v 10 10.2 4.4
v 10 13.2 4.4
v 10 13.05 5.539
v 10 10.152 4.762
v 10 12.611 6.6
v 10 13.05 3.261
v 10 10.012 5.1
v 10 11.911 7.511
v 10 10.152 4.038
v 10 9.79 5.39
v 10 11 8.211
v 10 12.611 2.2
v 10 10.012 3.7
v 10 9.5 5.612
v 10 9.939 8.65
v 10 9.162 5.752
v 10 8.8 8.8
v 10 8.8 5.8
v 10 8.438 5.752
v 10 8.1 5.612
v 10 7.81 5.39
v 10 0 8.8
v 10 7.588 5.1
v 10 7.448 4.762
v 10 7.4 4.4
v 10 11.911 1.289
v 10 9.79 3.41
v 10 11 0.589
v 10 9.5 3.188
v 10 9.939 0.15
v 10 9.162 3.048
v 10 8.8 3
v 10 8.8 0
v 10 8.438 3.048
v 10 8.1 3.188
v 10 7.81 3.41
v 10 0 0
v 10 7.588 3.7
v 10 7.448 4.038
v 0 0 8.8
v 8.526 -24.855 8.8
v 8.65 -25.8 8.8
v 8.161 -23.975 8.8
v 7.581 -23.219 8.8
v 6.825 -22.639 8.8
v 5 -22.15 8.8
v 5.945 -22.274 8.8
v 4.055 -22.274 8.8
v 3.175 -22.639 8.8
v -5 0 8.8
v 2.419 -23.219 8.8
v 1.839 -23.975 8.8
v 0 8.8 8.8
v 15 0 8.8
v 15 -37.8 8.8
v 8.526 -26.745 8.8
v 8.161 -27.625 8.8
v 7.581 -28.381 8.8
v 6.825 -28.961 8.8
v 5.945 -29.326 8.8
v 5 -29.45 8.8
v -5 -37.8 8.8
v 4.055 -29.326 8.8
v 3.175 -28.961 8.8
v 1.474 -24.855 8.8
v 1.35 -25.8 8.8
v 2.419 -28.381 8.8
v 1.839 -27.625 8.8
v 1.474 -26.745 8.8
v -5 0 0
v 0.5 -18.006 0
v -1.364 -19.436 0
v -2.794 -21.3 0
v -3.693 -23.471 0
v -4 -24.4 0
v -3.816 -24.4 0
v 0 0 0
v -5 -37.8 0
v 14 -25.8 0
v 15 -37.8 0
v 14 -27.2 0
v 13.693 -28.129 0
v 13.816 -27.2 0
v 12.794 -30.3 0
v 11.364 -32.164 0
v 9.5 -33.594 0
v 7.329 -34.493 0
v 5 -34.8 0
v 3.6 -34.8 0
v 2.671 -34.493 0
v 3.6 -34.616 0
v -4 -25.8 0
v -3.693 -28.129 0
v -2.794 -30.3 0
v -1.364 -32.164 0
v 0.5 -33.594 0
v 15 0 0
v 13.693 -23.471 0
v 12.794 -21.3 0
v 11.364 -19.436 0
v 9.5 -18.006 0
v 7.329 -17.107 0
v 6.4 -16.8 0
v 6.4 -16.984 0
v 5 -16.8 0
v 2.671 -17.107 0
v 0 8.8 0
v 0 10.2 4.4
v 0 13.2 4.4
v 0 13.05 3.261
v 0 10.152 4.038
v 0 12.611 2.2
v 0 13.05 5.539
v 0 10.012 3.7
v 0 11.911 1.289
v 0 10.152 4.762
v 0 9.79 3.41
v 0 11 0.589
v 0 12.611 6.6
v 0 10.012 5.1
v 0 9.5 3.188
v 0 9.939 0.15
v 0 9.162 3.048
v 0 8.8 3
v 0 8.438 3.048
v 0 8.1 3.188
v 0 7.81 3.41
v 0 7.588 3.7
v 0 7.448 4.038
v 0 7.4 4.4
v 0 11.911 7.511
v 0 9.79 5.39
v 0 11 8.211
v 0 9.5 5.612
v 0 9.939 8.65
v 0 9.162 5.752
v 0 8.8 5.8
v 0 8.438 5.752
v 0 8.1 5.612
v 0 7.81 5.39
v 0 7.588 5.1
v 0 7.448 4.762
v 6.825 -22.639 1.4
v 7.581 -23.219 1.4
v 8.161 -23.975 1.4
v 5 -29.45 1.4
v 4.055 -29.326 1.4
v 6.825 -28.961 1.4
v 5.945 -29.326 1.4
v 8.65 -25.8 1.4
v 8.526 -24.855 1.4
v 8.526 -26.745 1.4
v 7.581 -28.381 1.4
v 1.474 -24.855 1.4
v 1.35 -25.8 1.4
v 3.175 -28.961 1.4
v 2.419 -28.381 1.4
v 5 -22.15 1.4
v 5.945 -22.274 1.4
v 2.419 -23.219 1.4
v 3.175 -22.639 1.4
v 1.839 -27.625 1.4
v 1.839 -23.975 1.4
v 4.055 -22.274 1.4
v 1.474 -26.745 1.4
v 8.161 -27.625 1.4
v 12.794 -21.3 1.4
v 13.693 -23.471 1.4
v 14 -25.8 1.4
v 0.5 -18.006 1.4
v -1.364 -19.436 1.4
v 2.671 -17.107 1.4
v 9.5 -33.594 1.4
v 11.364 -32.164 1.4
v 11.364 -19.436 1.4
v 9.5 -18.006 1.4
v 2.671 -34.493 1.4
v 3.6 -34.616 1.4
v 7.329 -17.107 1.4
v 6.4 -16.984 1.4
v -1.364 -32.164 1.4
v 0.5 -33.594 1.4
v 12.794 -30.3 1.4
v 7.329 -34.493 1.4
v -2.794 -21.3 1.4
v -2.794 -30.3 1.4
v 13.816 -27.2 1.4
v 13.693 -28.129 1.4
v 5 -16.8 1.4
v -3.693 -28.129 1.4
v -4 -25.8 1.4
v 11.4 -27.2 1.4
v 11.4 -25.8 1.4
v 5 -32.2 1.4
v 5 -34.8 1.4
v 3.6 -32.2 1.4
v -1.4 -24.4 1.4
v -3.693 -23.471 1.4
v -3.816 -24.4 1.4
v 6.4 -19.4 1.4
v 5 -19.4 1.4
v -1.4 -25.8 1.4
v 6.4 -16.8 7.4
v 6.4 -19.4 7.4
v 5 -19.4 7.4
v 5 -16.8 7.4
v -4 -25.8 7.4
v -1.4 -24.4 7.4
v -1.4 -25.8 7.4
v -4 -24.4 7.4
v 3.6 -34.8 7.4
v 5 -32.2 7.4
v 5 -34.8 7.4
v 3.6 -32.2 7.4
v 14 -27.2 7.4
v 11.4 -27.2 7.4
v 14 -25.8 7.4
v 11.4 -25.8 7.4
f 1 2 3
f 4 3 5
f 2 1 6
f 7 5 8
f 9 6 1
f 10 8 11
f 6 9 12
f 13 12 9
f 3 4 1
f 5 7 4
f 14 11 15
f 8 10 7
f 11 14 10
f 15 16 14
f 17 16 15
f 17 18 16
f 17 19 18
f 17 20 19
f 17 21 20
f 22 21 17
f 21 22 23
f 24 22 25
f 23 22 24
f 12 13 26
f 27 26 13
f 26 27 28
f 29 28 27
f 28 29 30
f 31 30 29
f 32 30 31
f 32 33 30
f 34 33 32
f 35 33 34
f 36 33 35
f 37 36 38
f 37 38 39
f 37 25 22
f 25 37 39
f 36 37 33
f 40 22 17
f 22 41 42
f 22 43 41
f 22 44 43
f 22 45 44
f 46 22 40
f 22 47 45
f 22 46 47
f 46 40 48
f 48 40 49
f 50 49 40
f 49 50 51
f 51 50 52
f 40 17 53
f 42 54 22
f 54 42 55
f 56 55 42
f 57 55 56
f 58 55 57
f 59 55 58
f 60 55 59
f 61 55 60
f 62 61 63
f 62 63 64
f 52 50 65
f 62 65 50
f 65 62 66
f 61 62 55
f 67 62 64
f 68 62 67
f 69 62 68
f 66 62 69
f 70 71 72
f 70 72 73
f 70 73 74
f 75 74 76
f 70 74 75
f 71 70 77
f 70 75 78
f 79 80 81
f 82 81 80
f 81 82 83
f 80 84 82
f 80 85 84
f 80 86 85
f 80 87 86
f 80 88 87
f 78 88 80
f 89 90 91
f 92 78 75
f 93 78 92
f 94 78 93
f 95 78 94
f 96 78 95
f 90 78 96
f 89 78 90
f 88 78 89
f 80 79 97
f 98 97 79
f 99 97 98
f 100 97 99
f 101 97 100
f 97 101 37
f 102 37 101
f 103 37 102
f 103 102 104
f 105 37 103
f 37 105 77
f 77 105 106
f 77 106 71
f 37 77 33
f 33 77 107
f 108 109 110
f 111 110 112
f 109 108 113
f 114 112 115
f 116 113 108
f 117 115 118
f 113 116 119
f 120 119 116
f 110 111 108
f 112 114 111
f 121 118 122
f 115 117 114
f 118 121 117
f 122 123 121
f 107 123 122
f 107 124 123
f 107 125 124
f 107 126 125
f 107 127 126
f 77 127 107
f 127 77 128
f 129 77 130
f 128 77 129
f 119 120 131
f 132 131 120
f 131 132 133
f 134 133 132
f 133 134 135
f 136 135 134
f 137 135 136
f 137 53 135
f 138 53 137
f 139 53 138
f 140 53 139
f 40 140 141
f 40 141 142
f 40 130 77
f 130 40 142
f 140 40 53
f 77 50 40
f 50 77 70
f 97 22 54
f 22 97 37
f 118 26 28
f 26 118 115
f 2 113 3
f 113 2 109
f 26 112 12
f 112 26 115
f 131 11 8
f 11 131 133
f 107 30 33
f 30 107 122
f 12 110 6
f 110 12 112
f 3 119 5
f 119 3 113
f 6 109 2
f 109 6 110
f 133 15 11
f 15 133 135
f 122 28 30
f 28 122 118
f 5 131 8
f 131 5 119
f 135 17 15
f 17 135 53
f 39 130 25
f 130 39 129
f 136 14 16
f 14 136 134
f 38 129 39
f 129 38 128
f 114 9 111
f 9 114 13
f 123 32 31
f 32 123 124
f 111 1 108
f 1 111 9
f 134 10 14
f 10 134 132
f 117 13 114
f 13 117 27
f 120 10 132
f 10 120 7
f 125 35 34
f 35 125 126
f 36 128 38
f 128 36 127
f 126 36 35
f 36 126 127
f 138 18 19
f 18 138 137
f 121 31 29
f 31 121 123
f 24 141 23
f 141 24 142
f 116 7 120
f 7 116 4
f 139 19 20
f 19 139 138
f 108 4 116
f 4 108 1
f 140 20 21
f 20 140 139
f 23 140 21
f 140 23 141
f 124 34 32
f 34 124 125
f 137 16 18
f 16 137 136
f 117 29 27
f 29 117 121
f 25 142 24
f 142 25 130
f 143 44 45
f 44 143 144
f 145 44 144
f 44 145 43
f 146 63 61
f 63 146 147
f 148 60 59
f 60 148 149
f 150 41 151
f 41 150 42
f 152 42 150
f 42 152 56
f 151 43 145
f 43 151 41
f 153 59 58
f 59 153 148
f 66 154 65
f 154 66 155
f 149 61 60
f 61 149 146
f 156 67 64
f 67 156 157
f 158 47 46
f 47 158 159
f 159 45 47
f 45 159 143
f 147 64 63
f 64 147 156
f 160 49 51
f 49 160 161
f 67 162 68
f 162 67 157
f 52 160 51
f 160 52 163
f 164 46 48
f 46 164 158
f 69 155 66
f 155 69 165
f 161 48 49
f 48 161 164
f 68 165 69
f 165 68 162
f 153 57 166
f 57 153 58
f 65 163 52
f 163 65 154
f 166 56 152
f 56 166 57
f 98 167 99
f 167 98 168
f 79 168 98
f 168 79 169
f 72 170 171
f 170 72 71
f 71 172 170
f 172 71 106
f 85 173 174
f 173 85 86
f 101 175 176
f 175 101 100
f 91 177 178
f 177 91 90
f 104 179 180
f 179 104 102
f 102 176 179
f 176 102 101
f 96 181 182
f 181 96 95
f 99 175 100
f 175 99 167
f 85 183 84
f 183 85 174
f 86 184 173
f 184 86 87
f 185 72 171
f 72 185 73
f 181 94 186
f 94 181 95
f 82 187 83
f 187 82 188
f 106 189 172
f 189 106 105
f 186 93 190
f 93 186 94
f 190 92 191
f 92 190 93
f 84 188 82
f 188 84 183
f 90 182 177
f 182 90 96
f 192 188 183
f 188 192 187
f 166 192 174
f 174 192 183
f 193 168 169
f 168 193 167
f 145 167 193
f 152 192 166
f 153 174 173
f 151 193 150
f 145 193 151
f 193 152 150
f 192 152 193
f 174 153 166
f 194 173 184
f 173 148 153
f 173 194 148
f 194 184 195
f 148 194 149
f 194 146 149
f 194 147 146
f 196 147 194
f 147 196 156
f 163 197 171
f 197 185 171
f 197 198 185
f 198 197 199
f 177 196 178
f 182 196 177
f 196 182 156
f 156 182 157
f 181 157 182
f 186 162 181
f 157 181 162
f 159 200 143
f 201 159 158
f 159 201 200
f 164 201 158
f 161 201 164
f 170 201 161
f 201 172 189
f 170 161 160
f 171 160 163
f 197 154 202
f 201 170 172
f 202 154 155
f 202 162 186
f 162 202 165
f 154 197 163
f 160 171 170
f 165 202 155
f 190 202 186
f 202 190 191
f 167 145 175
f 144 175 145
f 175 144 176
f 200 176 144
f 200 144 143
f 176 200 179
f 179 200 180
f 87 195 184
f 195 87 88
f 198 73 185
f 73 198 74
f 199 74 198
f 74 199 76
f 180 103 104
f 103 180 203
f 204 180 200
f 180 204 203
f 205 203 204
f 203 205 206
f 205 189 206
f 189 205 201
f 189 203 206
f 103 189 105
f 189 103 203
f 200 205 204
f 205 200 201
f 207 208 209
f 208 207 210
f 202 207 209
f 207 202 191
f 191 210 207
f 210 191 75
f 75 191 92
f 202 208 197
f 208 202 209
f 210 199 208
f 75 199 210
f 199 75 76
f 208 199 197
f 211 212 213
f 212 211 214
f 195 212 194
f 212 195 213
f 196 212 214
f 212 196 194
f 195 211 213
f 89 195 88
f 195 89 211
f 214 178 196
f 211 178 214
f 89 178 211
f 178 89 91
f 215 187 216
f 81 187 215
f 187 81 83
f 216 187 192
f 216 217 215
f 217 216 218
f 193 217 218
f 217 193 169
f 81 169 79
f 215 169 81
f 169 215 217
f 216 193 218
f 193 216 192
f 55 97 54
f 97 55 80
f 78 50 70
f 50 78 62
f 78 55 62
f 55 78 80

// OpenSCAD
// file: common_vars.scad
// General parameters
wall_thickness = 3.0;
extra_space = 0.5;

// Board dimensions
board_thickness = 1.3;
board_size = 37.8;
board_hole_diameter = 2.0;
board_hole_center_distance_from_board_edge = 1.8;
board_elements_height = 2.0;

// Lens dimensions
lens_box_distance_from_board_edge = 11.0;
lens_box_size = 15.8;
lens_screw_head_diameter = 3.2;
lens_screw_offset = 9.3;
box_eyelet_size = 4;
box_eyelet_thickness = 3.2;

// Screw dimensions
screw_diameter = 1.5;
screw_depth = 9.0;
screw_wall_thickness = board_hole_center_distance_from_board_edge - screw_diameter / 2;
screw_well_x_offset = board_size / 2 - board_hole_center_distance_from_board_edge;
screw_well_z_offset = board_size / 2 - board_hole_center_distance_from_board_edge;

// Wire parameters
wire_diameter = 6.3;
wire_length = 35.0;
socket_width = 10.8;
socket_height = 10.8;

// Bolt parameters
nut_diameter = 6.2;
nut_height = 2.4;
bolt_diameter = 2.8;
bolt_well_wall_thickness = 1.0;
bolt_well_diameter_wide = nut_diameter / cos(180 / 6) + bolt_well_wall_thickness * 2;
bolt_well_diameter_narrow = bolt_diameter + bolt_well_wall_thickness * 2;
bolt_well_height = screw_depth + board_thickness + board_elements_height;
bolt_well_x_offset = board_size / 2 + extra_space + bolt_well_diameter_wide / 2;
bolt_well_y_offset = board_thickness + board_elements_height;
bolt_well_z_offset = board_size / 2 - bolt_well_diameter_wide / 2 + extra_space;
bolt_hole_y_offset = -bolt_well_height;

// Tail dimension
tail_x_dim = socket_width + wall_thickness * 2;
tail_y_dim = wire_length + wall_thickness;
tail_z_dim = socket_height + wall_thickness + extra_space;

// Hinge
hinge_length = 10.0;
hinge_diameter = bolt_diameter + 2 * wall_thickness;

// Stand
stand_length = board_size;

// T-Nut parameters
t_nut_well_diameter = 7.3;
t_nut_height = 8.8;
t_nut_cap_thicklness = 1.4;
t_nut_cap_diameter = 18.0;
t_nut_spike_length = 7.4;
t_nut_spike_width = 2.6;

module nut_trap() {
    cylinder(d = nut_diameter / cos(180 / 6) + 0.2, h = nut_height + 0.2, $fn = 6);
}

module bolt_well(vertical, height) {
    angle = vertical ? 180 : 90;
    rotate(a=[angle, 0, 0])
        cylinder($fn = 24, d1 = bolt_well_diameter_narrow, d2 = bolt_well_diameter_wide, h = height);
}

module bolt_hole(vertical) {
    angle = vertical ? 0 : 270;
    rotate(a=[angle, 0, 0]) union() {
        nut_trap();
        cylinder($fn = 24, h = 100, d = bolt_diameter);
    }
}

module tail() {
    difference() {
        union() {
            cube(size = [tail_x_dim, tail_y_dim, tail_z_dim]);
            translate([tail_x_dim, tail_y_dim / 3, tail_z_dim]) bolt_well(true, tail_z_dim);
            translate([0, tail_y_dim / 3 * 2, tail_z_dim]) bolt_well(true, tail_z_dim);
        }
        translate([tail_x_dim, tail_y_dim / 3, 0]) bolt_hole(true);
        translate([0, tail_y_dim / 3 * 2, 0]) bolt_hole(true);
        translate([socket_width / 2 + wall_thickness, 50, socket_height / 2]) rotate(a=[90, 0, 0]) cylinder($fn = 24, d = wire_diameter, h = 100);
    }
}

module socket_cutout() {
    cube(size = [socket_width, tail_y_dim, socket_height + extra_space], center=true);
}

module horizontal_wall() {
    translate([0, bolt_well_height / 2 + wall_thickness, wall_thickness / 2]) cube(size = [board_size + extra_space * 2 + bolt_well_diameter_wide * 2 + wall_thickness * 2, wall_thickness + bolt_well_height + wall_thickness, wall_thickness], center=true);
}

module side_wall() {
    translate([0, -wall_thickness - bolt_well_height, -board_size / 2 - extra_space - wall_thickness]) cube(size = [wall_thickness, wall_thickness + bolt_well_height + wall_thickness, board_size + extra_space * 2 + wall_thickness * 2]);
}

module hinge_block(cylinder_length) {
    difference() {
        union() {
            cube(size = [cylinder_length, hinge_diameter, hinge_diameter]);
            translate([0, hinge_diameter, hinge_diameter / 2]) rotate(a = [0, 90, 0]) cylinder($fn = 24, d = hinge_diameter, h = cylinder_length);
        }
        translate([0, hinge_diameter, hinge_diameter / 2]) rotate(a = [0, 90, 0]) cylinder($fn = 24, d = bolt_diameter, h = cylinder_length);
    }
}
// main file
include <common_vars.scad>

module t_nut_spike() {
    cube(size = [t_nut_cap_thicklness, t_nut_spike_width, t_nut_spike_length]);
}

module t_nut() {
    cylinder($fn = 24, d = t_nut_well_diameter, h = t_nut_height);
    cylinder($fn = 24, d = t_nut_cap_diameter, h = t_nut_cap_thicklness);
    translate([0, t_nut_cap_diameter / 2 - t_nut_spike_width, 0]) t_nut_spike();
    rotate(a = [0, 0, 90]) translate([0, t_nut_cap_diameter / 2 - t_nut_spike_width, 0]) t_nut_spike();
    rotate(a = [0, 0, 180]) translate([0, t_nut_cap_diameter / 2 - t_nut_spike_width, 0]) t_nut_spike();
    rotate(a = [0, 0, 270]) translate([0, t_nut_cap_diameter / 2 - t_nut_spike_width, 0]) t_nut_spike();
}

hinge_block(hinge_length);
difference() {
    translate([-hinge_length / 2, -stand_length, 0]) cube(size = [hinge_length * 2,     stand_length, t_nut_height]);
    translate([hinge_length / 2, -stand_length + t_nut_cap_diameter / 2 + wall_thickness, 0]) t_nut();
}
